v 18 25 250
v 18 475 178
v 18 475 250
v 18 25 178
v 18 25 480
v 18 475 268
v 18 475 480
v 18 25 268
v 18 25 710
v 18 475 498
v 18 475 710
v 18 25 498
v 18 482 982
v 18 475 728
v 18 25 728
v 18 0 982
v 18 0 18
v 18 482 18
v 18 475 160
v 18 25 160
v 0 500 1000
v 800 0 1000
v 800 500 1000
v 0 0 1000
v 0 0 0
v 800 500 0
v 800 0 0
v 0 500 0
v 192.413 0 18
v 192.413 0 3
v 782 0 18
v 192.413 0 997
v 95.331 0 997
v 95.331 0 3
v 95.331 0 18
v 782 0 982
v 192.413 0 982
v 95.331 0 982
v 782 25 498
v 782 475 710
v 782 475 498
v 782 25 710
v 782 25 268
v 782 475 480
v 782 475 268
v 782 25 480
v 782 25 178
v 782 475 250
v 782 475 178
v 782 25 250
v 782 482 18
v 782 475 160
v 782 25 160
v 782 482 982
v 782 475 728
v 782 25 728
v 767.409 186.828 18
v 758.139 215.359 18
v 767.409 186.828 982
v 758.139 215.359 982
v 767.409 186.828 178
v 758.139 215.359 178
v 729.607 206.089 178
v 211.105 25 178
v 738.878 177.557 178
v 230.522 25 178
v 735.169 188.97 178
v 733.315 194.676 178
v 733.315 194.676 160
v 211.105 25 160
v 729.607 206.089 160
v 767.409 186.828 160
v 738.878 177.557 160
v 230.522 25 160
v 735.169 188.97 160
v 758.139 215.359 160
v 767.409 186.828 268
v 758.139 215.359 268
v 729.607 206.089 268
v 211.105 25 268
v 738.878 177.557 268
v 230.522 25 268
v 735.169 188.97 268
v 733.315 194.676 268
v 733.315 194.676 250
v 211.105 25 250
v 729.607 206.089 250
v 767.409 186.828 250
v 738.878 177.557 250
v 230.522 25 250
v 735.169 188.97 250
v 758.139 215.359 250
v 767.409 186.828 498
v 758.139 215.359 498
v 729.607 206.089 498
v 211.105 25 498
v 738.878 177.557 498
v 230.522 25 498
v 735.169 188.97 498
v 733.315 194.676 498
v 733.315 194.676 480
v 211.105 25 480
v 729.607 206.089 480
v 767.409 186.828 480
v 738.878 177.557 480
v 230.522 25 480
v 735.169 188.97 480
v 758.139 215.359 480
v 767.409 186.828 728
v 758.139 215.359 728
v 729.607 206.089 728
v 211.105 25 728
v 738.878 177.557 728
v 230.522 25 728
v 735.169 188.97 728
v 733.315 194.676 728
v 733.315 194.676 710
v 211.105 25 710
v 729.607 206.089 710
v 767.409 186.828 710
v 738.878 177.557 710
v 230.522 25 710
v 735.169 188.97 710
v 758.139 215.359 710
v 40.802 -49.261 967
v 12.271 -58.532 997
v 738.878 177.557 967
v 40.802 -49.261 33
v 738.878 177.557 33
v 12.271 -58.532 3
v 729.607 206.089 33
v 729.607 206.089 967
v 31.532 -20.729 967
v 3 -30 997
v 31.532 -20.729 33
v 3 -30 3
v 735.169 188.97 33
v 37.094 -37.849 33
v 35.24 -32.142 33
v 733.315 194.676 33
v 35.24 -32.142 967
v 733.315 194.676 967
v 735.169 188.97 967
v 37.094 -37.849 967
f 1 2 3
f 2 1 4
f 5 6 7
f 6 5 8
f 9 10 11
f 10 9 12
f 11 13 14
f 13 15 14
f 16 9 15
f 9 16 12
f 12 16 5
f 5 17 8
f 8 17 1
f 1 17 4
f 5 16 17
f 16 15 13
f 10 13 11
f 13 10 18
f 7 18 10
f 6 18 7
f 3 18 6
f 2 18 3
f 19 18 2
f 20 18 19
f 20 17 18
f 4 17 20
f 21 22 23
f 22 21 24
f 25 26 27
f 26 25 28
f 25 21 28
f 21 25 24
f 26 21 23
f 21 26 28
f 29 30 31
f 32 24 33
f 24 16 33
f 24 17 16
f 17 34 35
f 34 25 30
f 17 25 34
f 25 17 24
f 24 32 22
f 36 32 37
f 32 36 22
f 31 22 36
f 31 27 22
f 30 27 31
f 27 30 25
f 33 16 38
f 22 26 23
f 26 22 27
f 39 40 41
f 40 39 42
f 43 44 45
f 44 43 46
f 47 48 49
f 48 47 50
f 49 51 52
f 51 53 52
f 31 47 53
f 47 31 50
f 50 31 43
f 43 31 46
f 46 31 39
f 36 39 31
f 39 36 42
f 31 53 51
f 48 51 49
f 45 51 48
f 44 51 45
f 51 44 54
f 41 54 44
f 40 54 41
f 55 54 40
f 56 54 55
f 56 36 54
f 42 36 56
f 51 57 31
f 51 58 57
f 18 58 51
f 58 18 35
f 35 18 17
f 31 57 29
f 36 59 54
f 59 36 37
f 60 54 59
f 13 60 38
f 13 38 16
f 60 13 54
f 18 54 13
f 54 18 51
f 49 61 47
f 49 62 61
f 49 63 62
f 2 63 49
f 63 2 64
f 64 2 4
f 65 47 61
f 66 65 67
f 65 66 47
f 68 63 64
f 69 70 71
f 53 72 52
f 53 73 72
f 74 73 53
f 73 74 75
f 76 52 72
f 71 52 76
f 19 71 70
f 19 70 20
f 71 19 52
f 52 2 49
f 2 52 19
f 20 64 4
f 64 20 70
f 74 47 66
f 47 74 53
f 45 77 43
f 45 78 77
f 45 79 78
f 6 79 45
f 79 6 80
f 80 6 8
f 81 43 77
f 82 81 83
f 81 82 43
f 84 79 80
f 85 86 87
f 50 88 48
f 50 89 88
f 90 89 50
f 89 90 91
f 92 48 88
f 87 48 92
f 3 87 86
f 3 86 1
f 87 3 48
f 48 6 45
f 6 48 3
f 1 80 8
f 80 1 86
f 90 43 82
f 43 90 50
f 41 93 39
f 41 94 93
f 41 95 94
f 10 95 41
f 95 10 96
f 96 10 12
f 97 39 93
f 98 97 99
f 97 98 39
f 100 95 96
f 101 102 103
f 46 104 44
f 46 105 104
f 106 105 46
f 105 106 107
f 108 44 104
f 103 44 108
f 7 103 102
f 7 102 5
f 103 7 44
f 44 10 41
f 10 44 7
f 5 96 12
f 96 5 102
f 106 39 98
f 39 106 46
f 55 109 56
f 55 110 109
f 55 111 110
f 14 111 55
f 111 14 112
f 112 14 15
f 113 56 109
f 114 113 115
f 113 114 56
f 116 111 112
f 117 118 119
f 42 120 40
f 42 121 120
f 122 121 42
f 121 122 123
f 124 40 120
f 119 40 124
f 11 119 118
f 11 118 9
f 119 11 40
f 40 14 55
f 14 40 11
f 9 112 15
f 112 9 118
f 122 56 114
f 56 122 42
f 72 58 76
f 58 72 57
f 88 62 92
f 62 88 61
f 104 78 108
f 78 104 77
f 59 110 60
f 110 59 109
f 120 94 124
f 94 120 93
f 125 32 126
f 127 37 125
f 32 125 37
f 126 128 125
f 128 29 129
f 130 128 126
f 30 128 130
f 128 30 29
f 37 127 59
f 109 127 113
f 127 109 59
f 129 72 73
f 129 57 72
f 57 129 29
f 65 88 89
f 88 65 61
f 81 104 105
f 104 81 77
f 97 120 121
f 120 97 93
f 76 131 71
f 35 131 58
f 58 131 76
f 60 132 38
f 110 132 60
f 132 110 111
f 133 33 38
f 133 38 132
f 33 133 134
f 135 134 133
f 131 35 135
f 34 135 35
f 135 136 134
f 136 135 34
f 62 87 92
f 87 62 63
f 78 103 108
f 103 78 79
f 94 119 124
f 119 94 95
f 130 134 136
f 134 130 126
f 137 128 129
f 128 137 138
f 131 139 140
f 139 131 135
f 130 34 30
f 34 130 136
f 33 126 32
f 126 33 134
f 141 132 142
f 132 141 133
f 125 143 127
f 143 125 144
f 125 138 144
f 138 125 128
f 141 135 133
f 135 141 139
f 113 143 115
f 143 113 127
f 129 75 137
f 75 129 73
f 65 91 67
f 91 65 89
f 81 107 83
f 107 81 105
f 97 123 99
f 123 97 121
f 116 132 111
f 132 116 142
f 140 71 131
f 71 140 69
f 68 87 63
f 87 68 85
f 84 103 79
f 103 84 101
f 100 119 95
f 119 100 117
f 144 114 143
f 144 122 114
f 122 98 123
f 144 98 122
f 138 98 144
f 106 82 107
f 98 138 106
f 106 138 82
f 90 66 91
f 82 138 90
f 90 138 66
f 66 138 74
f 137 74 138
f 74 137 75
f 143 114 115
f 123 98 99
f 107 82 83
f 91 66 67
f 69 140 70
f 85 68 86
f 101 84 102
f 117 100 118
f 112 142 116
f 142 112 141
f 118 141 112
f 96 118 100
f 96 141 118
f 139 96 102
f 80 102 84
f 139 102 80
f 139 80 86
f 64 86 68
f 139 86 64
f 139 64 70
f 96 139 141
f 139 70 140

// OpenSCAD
// file: ../config/TF3D-SDC-01_dimensions.scad
// Modelo fijo TF3D-SDC-01 — unidades en mm
CABINET_W = 800;
CABINET_H = 1000;
CABINET_D = 500;
BOARD_T = 18;
INNER_W = CABINET_W - 2*BOARD_T;
INNER_H = CABINET_H - 2*BOARD_T;
BACK_W = INNER_W;
BACK_H = INNER_H;
BACK_T = BOARD_T;
SHELF_W = INNER_W;
SHELF_D = 450;
SHELF_T = BOARD_T;
TECH_H = 160;
SHELF_Z_1 = 250;
SHELF_Z_2 = 480;
SHELF_Z_3 = 710;
MELAMINE = [0.94,0.94,0.94];
ACRYLIC = [0.65,0.85,1.00,0.30];
METAL = [0.10,0.10,0.10];
// file: ../config/common.scad
include <TF3D-SDC-01_dimensions.scad>
module board(size=[100,100,18], board_color=MELAMINE){ color(board_color) cube(size); }
// main file
include <../config/common.scad>
show_door=true; door_open_angle=18;
module cabinet_structure(){
 translate([0,0,0]) board([BOARD_T,CABINET_D,CABINET_H]);
 translate([CABINET_W-BOARD_T,0,0]) board([BOARD_T,CABINET_D,CABINET_H]);
 translate([BOARD_T,0,0]) board([INNER_W,CABINET_D,BOARD_T]);
 translate([BOARD_T,0,CABINET_H-BOARD_T]) board([INNER_W,CABINET_D,BOARD_T]);
 translate([BOARD_T,CABINET_D-BACK_T,BOARD_T]) board([BACK_W,BACK_T,BACK_H]);
 translate([BOARD_T,25,TECH_H]) board([SHELF_W,SHELF_D,SHELF_T]);
 translate([BOARD_T,25,SHELF_Z_1]) board([SHELF_W,SHELF_D,SHELF_T]);
 translate([BOARD_T,25,SHELF_Z_2]) board([SHELF_W,SHELF_D,SHELF_T]);
 translate([BOARD_T,25,SHELF_Z_3]) board([SHELF_W,SHELF_D,SHELF_T]);
}
module conceptual_door(){
 door_gap=3; door_w=CABINET_W-2*door_gap; door_h=CABINET_H-2*door_gap; frame=30; acrylic_t=6;
 module bar(size){ color(METAL) cube(size); }
 module geo(){
  bar([door_w,frame,frame]); translate([0,door_h-frame,0]) bar([door_w,frame,frame]);
  bar([frame,door_h,frame]); translate([door_w-frame,0,0]) bar([frame,door_h,frame]);
  translate([frame,frame,(frame-acrylic_t)/2]) color(ACRYLIC) cube([door_w-2*frame,door_h-2*frame,acrylic_t]);
 }
 translate([door_gap,-frame,door_gap]) rotate([90,0,door_open_angle]) geo();
}
cabinet_structure(); if(show_door) conceptual_door();
